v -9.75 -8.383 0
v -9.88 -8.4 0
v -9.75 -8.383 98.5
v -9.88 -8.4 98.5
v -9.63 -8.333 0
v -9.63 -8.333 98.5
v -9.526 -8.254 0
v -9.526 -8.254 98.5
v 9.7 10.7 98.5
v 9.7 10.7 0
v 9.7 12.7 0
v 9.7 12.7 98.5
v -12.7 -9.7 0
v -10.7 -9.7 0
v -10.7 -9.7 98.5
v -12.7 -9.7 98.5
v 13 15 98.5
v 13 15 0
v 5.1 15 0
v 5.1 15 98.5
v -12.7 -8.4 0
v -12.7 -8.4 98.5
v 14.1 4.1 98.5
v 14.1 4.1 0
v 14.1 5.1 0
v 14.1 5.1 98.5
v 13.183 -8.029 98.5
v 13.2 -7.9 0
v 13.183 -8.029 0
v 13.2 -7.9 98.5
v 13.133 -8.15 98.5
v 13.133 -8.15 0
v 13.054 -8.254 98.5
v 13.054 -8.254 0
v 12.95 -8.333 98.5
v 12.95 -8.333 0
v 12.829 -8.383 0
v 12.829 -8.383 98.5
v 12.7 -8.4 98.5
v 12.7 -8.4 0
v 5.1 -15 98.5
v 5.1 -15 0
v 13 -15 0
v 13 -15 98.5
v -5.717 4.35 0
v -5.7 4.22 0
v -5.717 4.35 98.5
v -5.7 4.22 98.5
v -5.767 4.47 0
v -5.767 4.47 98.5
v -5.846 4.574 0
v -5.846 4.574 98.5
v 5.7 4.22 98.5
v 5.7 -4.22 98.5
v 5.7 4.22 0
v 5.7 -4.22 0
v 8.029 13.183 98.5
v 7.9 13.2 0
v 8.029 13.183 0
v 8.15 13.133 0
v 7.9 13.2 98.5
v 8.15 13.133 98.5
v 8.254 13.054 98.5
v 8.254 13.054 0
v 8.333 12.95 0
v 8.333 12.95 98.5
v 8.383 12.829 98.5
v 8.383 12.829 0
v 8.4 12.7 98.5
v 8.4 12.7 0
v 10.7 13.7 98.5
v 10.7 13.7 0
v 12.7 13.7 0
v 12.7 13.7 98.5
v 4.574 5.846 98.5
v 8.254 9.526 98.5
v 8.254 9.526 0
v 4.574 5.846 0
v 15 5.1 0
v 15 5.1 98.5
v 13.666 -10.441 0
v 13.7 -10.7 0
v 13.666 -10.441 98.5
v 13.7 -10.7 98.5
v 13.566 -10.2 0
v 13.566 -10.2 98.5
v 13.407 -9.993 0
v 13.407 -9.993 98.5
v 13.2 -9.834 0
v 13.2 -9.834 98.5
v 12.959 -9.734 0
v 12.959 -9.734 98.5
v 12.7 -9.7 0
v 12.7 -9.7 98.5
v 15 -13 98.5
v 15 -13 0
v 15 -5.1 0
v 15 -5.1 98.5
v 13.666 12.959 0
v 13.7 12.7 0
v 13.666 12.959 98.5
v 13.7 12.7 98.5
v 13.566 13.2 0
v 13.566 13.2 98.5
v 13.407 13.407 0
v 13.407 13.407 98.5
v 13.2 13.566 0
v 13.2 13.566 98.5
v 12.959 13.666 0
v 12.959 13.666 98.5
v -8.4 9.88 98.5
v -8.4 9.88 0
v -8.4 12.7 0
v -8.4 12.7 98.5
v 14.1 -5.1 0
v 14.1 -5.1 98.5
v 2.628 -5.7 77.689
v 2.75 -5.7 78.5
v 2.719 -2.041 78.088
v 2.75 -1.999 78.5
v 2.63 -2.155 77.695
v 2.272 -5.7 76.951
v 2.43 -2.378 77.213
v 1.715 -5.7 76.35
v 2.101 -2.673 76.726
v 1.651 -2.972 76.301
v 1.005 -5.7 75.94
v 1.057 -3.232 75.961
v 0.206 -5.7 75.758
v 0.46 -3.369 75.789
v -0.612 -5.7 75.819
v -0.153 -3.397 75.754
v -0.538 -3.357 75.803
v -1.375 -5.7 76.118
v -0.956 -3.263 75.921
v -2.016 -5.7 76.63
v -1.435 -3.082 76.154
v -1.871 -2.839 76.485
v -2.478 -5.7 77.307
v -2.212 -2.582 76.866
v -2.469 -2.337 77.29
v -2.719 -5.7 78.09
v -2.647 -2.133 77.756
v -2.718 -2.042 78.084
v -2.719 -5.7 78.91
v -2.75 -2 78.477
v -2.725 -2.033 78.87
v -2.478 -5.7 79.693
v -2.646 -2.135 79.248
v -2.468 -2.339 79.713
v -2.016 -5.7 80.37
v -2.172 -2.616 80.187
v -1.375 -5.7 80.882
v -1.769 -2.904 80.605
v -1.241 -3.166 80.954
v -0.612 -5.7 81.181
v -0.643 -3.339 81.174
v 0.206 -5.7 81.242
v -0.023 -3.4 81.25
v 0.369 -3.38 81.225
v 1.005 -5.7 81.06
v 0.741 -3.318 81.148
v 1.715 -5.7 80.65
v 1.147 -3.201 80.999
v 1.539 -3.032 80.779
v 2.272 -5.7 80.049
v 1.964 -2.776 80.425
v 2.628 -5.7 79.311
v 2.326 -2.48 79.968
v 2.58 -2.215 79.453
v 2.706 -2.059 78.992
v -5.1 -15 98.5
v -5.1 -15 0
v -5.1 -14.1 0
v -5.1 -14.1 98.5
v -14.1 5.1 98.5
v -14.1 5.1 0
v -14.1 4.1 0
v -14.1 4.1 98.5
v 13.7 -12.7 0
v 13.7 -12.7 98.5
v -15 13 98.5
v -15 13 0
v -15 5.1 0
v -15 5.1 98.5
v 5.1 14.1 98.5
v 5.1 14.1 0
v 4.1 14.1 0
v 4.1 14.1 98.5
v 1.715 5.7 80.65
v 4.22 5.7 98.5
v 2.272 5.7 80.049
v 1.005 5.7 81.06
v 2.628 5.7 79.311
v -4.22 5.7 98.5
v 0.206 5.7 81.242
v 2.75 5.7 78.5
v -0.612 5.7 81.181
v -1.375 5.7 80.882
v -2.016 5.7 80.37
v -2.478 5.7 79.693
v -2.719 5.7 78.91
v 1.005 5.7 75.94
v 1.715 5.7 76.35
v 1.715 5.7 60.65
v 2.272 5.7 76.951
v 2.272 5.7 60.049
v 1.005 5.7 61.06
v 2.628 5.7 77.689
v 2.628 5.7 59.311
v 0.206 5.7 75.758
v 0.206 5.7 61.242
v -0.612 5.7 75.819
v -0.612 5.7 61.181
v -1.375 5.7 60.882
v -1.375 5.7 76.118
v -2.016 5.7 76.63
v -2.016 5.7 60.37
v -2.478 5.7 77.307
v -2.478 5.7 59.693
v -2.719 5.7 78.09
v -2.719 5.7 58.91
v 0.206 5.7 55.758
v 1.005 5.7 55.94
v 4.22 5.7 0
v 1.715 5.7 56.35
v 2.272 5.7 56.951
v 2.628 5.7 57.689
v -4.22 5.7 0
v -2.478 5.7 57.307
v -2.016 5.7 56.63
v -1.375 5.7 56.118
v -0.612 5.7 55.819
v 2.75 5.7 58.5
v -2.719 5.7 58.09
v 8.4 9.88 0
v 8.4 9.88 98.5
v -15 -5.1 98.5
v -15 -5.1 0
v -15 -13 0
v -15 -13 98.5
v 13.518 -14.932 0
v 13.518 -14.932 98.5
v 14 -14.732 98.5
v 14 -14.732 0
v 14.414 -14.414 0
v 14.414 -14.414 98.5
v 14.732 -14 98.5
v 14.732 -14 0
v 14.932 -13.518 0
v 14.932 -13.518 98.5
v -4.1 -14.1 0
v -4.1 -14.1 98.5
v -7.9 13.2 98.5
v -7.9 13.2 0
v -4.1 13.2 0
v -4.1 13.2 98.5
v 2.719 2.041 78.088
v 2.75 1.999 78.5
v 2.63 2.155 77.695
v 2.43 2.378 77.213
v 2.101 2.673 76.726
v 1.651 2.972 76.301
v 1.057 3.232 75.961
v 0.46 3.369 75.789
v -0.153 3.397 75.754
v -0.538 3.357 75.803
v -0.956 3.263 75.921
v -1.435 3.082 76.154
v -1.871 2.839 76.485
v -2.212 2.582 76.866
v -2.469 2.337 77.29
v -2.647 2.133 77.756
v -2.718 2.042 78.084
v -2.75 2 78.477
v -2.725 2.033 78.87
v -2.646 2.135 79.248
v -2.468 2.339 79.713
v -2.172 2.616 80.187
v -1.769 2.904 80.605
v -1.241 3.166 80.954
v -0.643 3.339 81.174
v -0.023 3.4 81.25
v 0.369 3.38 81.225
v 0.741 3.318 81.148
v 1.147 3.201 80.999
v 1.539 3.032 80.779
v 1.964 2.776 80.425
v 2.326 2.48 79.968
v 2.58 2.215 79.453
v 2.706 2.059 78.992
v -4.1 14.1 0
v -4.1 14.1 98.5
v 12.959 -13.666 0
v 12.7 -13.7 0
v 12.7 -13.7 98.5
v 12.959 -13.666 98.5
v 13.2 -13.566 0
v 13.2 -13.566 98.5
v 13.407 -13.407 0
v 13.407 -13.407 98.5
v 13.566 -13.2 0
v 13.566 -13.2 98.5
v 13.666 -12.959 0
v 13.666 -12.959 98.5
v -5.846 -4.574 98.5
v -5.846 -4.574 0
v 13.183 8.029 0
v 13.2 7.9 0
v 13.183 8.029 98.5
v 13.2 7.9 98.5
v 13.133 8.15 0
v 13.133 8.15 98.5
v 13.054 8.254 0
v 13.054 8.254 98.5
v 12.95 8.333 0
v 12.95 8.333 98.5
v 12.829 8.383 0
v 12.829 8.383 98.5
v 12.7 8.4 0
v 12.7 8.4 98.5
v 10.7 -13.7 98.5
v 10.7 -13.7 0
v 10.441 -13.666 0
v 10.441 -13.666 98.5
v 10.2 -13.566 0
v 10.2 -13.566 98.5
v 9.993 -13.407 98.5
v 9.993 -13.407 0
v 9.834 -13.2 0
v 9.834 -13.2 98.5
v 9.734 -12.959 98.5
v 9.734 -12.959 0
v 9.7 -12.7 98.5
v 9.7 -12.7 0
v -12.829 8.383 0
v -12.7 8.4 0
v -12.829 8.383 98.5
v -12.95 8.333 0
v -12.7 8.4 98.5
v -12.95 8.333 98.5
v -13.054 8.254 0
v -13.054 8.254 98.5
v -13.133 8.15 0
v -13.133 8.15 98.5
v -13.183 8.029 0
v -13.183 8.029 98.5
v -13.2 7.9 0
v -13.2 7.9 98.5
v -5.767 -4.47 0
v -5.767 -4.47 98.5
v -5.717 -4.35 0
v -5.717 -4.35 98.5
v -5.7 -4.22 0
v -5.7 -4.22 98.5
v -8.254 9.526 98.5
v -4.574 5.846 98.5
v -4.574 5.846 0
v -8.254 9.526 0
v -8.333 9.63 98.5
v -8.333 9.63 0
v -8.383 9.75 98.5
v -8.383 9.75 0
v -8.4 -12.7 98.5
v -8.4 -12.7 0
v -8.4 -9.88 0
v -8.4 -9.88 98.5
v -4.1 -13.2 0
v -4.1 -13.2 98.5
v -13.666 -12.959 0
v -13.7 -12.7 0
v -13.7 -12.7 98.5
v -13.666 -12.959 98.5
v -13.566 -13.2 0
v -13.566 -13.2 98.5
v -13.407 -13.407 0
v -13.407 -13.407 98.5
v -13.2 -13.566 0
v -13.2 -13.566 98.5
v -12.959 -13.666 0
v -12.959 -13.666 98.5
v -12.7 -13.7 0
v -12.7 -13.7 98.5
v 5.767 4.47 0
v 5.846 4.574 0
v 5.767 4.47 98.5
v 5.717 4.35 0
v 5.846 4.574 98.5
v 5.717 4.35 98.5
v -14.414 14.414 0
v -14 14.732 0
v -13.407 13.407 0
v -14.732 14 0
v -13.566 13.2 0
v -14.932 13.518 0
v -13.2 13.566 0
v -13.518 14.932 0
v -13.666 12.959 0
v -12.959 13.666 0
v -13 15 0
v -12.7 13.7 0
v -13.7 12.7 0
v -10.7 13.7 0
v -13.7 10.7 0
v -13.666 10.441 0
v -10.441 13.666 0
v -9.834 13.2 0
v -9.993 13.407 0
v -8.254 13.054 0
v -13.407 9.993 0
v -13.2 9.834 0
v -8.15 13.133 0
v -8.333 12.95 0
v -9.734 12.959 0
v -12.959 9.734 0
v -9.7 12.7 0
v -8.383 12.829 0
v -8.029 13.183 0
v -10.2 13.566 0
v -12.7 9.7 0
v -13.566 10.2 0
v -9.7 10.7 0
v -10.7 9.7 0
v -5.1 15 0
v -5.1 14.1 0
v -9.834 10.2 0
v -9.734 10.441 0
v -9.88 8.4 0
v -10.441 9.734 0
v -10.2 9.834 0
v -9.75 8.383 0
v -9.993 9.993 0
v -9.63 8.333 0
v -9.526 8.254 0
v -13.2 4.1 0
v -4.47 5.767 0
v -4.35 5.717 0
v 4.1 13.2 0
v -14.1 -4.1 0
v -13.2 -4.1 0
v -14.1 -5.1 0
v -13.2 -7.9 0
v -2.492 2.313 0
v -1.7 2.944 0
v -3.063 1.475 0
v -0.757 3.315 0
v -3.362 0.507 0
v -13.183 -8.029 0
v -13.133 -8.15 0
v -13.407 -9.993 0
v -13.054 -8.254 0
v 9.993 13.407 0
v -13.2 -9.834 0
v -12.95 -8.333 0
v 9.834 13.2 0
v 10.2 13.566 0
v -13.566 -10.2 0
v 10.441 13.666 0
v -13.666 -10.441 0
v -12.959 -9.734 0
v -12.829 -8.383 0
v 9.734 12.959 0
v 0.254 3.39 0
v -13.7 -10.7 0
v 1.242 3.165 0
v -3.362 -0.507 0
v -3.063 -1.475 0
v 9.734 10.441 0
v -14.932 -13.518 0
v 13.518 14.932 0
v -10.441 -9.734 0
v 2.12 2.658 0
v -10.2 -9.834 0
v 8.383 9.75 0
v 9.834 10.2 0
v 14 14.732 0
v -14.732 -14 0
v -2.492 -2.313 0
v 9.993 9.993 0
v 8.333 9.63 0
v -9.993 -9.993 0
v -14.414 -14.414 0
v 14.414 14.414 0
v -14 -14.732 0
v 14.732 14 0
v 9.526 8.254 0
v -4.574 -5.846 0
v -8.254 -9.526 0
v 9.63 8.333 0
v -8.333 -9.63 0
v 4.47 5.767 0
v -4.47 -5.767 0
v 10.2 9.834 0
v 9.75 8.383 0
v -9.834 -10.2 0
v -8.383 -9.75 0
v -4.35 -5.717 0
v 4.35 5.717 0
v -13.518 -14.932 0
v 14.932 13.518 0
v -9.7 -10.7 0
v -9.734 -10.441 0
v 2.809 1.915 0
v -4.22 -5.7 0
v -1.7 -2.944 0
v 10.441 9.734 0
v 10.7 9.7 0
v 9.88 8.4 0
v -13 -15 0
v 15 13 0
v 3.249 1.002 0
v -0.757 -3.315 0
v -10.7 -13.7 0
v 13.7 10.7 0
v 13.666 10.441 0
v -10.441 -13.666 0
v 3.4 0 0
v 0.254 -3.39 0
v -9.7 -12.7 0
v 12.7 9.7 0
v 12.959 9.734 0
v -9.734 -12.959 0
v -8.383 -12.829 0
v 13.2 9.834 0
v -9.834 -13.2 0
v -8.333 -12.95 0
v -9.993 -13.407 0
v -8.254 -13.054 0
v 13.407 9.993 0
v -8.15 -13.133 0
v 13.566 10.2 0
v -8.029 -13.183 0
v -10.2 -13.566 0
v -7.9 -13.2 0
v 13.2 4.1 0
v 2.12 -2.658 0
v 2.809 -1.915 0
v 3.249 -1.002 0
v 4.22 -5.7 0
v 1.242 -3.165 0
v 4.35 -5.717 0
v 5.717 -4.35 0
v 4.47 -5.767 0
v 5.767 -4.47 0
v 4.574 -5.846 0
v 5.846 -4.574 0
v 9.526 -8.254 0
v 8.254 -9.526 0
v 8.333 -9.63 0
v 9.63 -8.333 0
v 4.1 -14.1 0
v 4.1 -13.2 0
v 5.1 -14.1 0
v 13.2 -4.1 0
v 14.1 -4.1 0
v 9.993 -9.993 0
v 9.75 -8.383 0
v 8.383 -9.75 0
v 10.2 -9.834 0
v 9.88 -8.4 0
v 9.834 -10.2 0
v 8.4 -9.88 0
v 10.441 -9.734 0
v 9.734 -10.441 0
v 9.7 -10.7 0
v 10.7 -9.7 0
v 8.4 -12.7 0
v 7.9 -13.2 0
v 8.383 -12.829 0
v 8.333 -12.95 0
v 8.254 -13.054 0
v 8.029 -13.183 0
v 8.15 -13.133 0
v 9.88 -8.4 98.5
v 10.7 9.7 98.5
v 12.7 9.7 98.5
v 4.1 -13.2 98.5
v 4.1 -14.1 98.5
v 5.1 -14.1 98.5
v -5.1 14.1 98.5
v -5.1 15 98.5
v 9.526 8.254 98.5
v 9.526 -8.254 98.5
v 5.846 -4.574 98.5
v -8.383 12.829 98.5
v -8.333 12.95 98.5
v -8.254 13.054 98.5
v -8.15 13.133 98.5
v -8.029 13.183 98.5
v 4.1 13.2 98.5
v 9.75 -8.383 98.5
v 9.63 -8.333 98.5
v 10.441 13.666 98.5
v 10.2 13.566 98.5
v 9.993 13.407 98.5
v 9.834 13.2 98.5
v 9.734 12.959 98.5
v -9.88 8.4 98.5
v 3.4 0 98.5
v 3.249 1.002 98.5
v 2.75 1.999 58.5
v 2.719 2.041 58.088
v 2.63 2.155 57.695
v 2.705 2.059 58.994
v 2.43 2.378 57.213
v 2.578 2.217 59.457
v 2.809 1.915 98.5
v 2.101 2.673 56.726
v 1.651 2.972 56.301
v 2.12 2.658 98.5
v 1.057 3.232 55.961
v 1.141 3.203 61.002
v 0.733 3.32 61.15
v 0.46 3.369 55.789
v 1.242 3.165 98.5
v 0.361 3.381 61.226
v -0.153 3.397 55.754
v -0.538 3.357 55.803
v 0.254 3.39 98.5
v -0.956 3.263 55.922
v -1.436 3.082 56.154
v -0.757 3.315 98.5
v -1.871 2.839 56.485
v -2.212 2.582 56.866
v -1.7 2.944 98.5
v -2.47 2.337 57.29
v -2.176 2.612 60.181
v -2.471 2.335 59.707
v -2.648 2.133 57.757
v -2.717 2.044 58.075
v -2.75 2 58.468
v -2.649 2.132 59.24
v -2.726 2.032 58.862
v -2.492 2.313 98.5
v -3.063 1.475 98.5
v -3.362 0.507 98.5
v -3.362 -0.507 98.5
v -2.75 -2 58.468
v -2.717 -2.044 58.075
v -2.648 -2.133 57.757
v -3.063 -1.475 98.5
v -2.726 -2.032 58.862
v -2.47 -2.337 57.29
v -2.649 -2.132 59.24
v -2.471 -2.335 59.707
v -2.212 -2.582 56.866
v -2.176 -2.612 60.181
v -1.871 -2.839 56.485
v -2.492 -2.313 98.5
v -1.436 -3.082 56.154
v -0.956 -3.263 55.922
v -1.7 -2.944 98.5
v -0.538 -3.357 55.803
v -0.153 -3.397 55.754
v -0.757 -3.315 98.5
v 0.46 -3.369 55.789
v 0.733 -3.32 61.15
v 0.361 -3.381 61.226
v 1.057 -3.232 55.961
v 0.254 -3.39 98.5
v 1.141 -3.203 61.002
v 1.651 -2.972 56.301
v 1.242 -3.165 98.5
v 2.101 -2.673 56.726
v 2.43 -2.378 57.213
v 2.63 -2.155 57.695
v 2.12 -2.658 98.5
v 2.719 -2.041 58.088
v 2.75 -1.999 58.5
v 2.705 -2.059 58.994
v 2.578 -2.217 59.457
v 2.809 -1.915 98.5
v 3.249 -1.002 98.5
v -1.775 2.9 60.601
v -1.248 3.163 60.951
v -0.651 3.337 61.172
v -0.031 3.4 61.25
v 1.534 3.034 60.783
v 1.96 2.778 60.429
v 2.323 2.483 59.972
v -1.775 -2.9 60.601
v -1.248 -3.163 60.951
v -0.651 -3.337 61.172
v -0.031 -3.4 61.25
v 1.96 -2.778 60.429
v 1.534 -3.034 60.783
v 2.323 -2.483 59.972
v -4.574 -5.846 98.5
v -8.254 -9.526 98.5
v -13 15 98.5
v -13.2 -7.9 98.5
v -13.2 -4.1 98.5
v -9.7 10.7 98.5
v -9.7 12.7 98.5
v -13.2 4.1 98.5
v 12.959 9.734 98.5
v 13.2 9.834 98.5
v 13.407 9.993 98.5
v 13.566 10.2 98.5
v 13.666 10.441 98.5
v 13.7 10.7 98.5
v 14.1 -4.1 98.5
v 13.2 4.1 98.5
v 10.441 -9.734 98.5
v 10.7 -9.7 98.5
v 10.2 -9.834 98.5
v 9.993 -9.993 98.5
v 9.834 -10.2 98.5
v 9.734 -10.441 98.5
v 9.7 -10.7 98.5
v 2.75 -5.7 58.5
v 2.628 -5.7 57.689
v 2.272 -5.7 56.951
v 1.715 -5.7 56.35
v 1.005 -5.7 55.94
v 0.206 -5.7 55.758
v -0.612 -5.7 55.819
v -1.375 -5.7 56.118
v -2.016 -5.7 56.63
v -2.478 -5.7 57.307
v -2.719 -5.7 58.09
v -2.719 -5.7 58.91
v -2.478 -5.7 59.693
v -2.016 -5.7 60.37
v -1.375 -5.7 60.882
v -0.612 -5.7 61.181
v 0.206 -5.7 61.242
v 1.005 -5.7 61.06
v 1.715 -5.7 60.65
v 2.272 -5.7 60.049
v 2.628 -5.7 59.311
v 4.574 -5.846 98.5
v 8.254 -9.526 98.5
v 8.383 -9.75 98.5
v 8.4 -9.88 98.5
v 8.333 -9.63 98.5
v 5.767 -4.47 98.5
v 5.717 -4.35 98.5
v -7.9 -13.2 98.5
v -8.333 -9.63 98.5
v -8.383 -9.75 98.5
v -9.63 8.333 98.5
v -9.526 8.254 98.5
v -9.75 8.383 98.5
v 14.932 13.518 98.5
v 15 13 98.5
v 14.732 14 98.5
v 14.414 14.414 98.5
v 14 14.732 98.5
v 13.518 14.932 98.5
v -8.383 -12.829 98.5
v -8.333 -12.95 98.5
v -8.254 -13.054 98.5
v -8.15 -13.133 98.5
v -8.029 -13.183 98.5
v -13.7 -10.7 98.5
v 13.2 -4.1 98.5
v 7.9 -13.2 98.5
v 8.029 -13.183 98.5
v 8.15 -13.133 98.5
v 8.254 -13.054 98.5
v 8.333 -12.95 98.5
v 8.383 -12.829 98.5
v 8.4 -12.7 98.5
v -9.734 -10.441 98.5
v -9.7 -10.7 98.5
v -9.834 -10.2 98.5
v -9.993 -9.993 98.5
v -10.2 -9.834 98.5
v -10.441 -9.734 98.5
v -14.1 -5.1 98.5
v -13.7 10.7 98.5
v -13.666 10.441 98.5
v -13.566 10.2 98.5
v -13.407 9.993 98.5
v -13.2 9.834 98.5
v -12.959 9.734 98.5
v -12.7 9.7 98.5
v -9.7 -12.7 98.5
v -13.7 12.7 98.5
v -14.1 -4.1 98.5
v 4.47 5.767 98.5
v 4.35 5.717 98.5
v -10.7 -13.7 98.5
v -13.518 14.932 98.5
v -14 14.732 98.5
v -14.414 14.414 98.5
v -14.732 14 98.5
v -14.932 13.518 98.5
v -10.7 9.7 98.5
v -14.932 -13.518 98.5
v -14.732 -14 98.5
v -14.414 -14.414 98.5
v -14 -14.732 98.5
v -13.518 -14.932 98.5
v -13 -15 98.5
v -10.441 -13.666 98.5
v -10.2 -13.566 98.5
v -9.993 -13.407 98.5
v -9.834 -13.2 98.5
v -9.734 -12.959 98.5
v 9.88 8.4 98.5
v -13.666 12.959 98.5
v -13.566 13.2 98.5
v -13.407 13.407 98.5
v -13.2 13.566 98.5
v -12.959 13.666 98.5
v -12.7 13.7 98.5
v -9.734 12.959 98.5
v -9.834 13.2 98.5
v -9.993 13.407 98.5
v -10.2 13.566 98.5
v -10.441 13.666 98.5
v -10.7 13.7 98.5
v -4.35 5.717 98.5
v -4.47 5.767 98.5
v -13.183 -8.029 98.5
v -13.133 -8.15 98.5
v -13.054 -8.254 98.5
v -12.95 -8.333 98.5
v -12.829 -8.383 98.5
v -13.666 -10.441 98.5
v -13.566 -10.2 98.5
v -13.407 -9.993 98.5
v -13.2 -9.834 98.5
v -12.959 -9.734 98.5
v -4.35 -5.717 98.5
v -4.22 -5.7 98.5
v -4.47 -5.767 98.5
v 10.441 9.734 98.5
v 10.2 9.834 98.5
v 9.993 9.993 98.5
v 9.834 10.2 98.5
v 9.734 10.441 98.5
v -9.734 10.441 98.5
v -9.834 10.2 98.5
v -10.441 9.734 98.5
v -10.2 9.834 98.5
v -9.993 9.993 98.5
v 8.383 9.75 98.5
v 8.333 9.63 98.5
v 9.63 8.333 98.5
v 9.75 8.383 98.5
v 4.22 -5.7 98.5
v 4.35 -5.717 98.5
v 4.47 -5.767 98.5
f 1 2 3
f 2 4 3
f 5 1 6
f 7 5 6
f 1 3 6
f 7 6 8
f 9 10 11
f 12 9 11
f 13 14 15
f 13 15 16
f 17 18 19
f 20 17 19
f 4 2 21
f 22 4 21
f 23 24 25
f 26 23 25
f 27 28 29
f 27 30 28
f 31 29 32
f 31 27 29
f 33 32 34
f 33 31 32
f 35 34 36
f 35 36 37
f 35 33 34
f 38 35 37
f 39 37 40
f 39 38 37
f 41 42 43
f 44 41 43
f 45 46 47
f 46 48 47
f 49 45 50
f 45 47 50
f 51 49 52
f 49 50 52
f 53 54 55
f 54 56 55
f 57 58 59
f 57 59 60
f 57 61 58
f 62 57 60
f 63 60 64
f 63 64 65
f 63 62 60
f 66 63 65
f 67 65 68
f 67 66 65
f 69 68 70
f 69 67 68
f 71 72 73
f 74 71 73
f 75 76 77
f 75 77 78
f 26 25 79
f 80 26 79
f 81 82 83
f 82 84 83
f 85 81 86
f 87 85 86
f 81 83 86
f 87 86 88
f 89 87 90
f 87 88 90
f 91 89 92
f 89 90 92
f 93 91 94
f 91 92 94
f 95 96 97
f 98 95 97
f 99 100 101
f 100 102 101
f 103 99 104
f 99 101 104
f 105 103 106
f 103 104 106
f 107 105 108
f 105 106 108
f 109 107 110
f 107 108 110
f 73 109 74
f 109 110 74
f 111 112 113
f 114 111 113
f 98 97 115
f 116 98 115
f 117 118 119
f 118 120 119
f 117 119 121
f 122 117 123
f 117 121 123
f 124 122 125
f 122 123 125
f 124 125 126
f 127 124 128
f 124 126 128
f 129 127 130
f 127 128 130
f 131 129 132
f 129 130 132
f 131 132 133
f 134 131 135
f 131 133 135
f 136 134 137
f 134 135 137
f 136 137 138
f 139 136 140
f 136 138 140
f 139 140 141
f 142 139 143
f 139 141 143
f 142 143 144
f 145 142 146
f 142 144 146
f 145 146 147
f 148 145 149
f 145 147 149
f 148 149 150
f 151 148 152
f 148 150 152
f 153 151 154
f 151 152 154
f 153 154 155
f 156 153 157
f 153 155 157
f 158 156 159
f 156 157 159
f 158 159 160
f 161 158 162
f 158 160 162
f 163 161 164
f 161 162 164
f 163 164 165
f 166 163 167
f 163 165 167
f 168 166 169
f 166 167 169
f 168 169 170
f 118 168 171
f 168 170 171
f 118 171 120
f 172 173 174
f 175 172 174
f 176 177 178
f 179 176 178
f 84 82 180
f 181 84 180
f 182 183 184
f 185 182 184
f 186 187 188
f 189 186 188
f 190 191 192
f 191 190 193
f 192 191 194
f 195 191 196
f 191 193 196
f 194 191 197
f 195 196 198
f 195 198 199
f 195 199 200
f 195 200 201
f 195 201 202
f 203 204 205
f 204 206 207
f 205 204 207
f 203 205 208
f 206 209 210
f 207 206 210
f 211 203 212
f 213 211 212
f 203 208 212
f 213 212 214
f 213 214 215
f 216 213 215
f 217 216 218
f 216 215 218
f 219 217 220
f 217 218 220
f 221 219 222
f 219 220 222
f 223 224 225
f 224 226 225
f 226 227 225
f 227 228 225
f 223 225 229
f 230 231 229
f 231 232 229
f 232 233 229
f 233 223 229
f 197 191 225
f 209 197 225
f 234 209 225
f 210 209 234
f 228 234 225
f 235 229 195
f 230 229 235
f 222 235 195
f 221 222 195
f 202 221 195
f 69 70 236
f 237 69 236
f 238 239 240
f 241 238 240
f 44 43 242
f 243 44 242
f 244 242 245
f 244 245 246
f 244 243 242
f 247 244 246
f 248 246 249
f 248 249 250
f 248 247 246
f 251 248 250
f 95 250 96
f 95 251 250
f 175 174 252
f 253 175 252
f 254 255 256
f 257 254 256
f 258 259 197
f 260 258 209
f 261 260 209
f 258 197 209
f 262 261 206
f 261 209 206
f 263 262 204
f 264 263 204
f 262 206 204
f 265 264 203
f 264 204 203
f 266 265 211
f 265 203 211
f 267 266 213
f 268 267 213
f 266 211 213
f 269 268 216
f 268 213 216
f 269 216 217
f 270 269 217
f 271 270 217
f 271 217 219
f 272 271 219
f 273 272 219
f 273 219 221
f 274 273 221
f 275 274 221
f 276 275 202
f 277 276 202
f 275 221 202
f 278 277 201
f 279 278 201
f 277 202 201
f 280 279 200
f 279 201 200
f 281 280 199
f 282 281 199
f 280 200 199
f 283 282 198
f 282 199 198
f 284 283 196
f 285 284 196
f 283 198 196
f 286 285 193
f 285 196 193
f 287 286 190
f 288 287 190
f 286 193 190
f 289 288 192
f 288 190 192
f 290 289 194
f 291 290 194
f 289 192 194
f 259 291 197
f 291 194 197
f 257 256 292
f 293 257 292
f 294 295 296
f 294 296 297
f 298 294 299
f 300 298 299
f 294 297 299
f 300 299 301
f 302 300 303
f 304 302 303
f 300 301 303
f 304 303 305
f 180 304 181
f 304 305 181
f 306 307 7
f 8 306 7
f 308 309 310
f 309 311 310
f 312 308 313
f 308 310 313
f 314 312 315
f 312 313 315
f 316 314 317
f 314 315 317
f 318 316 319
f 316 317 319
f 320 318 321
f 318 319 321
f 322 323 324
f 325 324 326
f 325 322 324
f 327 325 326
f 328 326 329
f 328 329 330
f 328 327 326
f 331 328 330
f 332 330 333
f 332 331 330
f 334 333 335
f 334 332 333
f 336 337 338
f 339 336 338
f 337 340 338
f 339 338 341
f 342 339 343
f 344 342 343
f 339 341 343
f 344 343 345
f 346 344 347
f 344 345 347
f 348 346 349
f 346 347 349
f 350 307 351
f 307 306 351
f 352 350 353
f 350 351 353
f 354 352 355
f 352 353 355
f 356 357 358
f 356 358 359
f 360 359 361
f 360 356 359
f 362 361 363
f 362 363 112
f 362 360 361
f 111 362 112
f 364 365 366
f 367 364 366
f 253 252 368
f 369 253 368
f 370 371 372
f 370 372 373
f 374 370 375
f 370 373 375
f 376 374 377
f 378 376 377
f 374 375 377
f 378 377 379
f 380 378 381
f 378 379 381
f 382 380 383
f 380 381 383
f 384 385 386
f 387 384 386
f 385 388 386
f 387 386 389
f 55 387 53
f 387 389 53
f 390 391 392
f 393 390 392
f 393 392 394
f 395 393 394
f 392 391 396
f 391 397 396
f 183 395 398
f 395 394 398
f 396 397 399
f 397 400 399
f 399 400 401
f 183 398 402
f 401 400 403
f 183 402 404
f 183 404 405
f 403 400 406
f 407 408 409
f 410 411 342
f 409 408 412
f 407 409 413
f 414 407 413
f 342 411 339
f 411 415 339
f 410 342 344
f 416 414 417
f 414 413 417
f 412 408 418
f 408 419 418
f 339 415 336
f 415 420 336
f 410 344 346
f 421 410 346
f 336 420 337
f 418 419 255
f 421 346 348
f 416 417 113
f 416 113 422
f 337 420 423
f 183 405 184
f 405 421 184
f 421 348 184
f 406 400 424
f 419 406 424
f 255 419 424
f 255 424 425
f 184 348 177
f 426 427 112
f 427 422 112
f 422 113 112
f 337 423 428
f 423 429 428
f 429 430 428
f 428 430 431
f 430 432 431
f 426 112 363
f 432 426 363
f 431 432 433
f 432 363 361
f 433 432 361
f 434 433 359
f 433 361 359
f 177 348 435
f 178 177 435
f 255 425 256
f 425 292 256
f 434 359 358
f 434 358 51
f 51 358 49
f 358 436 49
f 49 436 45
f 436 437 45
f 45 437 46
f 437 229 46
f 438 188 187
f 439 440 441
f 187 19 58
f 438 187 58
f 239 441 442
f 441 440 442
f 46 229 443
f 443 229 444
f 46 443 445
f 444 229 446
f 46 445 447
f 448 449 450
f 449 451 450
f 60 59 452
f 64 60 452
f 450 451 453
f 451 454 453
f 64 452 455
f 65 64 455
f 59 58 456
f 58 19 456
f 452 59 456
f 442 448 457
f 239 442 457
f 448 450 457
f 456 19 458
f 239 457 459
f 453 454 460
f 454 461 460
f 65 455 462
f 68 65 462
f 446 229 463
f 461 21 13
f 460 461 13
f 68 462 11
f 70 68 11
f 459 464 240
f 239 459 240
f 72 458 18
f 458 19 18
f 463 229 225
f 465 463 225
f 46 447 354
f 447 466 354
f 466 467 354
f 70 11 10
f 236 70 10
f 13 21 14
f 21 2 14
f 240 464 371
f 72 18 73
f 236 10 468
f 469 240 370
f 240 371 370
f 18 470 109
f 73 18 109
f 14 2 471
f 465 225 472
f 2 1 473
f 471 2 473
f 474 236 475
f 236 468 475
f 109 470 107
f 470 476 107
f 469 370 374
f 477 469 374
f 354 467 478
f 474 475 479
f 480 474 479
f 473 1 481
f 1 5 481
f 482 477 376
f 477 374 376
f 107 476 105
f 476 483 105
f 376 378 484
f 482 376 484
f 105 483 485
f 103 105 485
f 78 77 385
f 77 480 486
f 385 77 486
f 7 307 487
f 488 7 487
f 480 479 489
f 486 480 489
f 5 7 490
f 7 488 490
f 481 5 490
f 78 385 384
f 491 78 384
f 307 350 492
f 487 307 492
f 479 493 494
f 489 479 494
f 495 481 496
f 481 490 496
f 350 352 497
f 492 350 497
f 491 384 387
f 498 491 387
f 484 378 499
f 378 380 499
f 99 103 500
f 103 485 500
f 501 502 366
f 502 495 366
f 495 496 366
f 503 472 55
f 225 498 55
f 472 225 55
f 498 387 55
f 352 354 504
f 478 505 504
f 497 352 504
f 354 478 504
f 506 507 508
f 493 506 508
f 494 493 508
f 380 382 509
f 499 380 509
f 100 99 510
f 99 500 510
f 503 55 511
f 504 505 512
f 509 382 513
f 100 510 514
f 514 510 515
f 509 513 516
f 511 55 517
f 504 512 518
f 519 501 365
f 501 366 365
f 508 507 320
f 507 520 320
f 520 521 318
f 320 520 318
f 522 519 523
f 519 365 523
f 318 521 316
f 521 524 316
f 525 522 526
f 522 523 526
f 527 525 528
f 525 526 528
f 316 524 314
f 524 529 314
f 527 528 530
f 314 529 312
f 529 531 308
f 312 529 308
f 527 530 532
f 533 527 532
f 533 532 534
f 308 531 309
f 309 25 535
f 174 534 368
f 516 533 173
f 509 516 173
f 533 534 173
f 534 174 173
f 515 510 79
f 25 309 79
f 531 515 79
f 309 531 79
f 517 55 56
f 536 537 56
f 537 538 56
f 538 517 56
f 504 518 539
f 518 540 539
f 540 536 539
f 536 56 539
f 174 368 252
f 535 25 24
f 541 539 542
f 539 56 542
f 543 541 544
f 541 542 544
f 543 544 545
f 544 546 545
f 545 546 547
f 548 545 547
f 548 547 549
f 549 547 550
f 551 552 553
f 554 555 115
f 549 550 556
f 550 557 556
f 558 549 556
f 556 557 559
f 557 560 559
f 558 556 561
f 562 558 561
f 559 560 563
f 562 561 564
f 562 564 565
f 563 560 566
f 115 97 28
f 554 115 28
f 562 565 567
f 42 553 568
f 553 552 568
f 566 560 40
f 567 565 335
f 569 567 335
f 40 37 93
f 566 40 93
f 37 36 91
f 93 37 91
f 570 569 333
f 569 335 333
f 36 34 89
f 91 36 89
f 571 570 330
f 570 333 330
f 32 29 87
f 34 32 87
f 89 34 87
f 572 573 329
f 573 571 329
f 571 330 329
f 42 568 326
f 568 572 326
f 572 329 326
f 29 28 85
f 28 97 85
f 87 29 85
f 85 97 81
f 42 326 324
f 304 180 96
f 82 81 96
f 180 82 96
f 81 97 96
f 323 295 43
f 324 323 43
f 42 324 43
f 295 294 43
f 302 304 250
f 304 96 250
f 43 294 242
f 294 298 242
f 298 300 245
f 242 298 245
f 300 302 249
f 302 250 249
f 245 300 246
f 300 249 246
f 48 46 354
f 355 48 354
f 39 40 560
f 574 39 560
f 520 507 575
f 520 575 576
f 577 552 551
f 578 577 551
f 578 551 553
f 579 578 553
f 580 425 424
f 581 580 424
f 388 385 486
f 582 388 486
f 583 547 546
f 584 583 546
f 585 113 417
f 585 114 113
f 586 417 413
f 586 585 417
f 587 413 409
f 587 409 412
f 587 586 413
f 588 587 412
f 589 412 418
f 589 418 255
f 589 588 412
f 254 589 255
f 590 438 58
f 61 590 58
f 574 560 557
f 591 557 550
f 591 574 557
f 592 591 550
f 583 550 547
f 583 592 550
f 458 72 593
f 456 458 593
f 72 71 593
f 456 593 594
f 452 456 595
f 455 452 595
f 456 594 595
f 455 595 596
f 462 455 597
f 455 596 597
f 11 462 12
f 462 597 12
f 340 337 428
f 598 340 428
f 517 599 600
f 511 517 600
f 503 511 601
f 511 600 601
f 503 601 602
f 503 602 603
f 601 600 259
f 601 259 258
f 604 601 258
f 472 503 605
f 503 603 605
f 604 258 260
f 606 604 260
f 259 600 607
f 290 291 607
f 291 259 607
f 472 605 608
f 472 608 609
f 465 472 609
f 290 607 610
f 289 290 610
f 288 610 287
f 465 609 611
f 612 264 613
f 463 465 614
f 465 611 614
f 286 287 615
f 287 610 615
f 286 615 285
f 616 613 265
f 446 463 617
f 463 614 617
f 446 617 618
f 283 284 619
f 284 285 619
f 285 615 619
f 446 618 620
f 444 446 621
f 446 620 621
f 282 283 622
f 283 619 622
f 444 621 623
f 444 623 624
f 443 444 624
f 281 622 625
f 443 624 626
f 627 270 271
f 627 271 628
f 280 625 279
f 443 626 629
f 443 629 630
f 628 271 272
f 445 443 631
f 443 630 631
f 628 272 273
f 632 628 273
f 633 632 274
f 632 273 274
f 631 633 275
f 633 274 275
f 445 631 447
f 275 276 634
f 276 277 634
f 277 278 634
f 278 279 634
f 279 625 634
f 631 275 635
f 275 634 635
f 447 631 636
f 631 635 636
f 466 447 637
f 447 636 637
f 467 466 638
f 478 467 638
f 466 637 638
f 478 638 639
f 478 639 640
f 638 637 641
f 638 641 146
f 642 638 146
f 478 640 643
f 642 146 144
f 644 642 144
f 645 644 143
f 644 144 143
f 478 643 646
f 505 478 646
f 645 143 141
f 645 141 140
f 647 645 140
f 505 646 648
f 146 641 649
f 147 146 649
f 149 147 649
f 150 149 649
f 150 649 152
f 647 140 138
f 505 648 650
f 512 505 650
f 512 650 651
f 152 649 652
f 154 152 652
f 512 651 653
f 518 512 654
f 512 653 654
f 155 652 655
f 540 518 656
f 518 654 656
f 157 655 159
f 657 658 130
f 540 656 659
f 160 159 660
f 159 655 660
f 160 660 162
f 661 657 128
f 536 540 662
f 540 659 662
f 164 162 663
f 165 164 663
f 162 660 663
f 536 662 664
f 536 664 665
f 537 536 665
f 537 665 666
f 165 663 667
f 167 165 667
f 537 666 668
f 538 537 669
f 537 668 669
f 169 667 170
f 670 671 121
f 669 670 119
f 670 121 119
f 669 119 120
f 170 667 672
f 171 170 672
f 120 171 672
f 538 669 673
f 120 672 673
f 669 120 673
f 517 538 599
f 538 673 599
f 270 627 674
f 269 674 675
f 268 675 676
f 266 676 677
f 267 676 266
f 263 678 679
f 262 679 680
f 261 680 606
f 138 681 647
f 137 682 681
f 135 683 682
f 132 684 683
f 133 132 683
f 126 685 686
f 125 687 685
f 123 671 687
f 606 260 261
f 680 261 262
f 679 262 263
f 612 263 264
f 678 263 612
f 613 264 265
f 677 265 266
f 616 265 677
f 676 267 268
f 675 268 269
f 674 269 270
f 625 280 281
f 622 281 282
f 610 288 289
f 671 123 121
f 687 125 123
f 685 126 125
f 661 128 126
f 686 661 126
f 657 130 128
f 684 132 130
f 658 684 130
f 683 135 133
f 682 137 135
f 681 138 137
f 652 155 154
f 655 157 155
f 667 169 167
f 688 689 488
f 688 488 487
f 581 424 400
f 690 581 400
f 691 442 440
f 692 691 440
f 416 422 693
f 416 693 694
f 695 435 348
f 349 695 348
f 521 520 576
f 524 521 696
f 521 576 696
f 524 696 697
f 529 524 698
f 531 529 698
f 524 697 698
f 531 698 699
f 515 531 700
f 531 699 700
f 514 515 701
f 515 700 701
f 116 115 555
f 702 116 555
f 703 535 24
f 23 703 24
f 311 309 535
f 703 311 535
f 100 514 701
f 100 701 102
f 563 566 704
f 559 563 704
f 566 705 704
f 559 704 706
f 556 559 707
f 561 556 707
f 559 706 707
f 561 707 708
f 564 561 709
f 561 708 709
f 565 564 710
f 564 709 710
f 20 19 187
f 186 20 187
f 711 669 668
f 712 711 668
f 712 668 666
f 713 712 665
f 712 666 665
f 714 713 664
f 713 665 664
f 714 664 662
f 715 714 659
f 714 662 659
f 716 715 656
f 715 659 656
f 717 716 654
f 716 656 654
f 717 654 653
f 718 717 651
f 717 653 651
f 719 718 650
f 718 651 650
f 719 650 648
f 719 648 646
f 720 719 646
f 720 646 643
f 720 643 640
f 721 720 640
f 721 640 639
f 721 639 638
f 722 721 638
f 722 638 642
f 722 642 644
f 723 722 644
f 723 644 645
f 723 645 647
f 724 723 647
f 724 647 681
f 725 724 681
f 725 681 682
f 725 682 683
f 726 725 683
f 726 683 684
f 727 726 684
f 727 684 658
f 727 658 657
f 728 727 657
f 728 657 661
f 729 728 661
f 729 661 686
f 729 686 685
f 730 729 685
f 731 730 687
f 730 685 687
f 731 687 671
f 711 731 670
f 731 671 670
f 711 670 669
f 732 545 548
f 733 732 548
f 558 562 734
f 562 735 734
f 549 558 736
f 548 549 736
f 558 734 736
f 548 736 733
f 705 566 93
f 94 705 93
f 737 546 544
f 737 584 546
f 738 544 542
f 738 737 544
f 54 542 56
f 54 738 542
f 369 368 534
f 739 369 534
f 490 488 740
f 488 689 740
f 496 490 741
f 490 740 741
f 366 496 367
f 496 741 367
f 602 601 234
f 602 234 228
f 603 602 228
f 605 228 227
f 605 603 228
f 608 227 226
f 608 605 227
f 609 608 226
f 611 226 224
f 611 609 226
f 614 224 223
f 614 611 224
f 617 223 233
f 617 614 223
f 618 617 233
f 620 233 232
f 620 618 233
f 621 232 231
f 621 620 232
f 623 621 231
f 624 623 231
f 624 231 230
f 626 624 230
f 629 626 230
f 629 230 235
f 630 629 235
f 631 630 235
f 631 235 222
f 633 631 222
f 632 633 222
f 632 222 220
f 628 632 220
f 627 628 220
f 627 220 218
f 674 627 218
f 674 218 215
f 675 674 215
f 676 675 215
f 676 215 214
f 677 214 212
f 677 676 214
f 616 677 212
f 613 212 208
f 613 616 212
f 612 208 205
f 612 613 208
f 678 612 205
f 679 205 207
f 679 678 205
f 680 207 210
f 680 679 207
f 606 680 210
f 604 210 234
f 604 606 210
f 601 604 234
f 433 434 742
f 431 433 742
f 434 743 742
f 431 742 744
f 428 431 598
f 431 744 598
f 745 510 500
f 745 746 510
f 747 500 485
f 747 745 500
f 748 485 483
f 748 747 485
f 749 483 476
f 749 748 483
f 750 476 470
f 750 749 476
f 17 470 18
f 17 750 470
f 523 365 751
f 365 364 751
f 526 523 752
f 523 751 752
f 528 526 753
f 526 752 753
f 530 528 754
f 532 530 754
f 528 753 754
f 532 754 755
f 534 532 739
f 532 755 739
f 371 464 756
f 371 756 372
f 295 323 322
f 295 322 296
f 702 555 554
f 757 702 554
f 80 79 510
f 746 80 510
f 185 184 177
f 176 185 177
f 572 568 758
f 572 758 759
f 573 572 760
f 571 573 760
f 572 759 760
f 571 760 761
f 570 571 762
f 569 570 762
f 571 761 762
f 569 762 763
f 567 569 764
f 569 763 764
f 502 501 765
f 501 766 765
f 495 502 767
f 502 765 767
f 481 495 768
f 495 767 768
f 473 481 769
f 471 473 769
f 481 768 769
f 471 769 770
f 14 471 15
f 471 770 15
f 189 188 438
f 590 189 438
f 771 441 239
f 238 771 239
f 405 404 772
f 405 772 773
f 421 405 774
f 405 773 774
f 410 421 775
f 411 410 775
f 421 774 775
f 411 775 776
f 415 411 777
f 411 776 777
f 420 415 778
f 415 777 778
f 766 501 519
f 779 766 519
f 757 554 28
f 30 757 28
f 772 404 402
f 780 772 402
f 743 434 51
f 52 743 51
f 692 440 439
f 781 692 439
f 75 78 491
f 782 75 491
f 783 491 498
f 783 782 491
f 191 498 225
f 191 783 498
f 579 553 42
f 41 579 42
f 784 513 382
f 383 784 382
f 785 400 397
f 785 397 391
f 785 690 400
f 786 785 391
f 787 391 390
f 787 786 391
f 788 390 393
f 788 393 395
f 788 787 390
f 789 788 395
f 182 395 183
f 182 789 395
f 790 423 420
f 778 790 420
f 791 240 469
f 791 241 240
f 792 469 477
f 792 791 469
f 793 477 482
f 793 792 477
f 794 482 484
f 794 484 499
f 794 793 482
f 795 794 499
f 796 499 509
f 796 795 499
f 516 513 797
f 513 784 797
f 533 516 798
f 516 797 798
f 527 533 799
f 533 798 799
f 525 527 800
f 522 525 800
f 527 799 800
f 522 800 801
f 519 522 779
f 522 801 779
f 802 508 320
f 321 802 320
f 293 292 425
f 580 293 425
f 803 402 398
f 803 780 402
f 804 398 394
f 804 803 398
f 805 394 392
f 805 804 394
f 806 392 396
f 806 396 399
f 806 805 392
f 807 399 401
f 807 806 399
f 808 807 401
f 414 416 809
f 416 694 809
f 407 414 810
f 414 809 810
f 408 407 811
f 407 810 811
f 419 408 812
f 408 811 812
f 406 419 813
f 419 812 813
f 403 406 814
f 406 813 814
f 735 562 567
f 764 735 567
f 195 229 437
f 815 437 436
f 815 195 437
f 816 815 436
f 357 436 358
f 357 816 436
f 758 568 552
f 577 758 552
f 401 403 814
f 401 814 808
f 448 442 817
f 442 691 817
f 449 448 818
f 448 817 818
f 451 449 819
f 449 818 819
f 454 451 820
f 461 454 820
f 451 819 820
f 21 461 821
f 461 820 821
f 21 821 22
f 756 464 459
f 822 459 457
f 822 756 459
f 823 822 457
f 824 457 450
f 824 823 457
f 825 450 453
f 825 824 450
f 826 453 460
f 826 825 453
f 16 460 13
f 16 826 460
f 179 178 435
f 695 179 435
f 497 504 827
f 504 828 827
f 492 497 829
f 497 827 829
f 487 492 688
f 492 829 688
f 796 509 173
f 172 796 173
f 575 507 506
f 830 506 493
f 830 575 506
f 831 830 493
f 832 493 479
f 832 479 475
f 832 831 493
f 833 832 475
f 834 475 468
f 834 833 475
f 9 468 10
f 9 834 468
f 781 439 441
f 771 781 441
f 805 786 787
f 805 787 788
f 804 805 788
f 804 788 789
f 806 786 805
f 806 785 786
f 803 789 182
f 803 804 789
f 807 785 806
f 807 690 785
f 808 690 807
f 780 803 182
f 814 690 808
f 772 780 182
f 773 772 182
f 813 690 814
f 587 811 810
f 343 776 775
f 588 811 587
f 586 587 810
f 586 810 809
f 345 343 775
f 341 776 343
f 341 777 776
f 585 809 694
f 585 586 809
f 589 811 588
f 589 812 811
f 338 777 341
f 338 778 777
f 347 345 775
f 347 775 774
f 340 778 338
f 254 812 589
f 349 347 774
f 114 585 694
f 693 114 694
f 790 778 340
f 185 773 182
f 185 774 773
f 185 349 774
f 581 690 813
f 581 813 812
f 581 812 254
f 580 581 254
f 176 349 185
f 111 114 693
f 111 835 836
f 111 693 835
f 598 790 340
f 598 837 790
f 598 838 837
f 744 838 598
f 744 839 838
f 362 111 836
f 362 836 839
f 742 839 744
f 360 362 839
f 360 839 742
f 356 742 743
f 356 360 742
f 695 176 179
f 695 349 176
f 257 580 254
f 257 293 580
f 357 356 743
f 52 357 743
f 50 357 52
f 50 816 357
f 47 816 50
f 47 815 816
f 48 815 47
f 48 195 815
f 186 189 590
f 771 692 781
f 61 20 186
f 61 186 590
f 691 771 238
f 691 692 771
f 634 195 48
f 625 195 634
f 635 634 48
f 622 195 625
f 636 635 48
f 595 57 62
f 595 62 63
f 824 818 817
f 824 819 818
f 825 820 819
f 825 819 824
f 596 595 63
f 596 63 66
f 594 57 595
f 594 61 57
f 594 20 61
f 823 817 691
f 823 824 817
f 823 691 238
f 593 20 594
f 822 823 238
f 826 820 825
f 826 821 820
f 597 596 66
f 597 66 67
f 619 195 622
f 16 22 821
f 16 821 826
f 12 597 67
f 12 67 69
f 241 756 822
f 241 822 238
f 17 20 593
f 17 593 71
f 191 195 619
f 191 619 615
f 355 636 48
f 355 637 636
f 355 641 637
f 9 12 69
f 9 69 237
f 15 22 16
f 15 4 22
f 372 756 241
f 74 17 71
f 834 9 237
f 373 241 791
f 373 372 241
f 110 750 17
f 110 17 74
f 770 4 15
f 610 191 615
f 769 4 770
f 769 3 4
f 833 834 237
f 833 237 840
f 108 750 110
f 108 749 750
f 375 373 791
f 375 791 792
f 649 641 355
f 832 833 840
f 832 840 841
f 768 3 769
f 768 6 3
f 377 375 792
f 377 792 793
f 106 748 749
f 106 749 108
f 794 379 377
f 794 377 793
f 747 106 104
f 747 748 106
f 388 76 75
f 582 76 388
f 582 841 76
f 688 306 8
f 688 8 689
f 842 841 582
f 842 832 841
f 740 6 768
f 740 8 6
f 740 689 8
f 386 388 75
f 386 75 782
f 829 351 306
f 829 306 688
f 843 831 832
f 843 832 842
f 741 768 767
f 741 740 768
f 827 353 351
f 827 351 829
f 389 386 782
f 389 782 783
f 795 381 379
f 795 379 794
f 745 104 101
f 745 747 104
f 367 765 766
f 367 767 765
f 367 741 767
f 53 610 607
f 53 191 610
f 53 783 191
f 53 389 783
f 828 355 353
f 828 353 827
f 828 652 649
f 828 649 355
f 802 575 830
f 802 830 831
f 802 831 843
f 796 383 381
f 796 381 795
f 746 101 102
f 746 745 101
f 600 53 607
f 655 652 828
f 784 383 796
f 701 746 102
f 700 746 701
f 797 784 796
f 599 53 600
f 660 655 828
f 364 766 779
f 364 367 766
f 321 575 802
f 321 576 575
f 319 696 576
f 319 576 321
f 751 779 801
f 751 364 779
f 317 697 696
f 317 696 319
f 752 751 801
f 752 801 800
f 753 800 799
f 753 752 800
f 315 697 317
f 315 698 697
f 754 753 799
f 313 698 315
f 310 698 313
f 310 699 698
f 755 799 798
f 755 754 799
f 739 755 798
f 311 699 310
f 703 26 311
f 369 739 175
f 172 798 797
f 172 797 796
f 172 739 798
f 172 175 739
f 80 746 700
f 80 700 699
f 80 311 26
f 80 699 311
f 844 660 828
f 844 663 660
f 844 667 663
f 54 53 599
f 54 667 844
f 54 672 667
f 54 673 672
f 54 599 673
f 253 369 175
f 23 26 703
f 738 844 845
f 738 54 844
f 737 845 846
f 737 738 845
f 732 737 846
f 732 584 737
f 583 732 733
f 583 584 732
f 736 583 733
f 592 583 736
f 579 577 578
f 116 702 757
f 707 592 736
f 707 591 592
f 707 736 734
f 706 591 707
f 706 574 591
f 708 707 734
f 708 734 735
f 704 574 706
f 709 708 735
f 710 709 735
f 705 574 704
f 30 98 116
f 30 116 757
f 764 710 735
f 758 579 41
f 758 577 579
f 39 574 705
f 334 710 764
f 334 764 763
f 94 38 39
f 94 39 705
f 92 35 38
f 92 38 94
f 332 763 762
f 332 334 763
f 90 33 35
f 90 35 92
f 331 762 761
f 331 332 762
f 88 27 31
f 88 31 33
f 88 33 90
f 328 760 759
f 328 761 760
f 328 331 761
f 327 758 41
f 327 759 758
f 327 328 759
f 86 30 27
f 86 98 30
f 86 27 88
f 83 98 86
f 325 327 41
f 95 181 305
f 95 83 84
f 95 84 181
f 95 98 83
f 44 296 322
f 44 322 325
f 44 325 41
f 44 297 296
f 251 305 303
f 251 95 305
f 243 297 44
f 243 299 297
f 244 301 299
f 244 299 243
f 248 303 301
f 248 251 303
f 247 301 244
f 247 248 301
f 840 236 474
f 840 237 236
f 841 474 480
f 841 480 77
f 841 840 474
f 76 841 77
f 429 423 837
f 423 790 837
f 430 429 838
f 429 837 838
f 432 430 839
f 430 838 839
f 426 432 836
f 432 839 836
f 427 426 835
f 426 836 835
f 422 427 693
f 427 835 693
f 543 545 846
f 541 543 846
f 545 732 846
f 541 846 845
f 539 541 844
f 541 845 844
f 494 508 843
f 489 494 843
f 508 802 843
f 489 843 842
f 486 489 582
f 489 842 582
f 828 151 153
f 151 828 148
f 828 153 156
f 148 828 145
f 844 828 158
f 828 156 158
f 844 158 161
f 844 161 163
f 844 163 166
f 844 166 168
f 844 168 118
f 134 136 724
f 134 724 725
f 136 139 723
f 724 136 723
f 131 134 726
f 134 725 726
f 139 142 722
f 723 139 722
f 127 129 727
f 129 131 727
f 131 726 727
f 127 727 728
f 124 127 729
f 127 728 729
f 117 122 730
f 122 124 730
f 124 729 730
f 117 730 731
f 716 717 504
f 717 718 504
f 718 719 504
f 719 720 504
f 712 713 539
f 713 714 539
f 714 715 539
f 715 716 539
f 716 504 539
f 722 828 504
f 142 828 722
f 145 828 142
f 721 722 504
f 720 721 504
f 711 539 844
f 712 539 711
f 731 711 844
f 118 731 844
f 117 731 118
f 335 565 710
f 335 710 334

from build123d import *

# Parameters (mm, degrees)
SKETCH_1_W                       = 4
SKETCH_1_H                       = 4
EXTRUDE_1_DEPTH                  = 98.5
FILLET_1_R                       = 1
FILLET_2_R                       = 2
FILLET_3_R                       = 0.5
PATTERN_CIRCULAR_1_COUNT         = 4
FILLET_1_OF_PATTERN_CIRCULAR_1_R = 1
FILLET_2_OF_PATTERN_CIRCULAR_1_R = 2
FILLET_3_OF_PATTERN_CIRCULAR_1_R = 0.5
SKETCH_2_R                       = 3.4
CUT_EXTRUDE_1_DEPTH              = 99.5
SKETCH_3_R                       = 2.75
CUT_EXTRUDE_2_DEPTH              = 530


with BuildPart() as part:
    # 草图1 → 凸台-拉伸1 (new body)
    with BuildSketch(Plane.XY):
        Polygon((5.7, 0), (5.7, 4.427207794), (9.672792206, 8.4), (13.2, 8.4), (13.2, 4.1), (14.1, 4.1), (14.1, 5.1), (15, 5.1), (15, 15), (5.1, 15), (5.1, 14.1), (4.1, 14.1), (4.1, 13.2), (8.4, 13.2), (8.4, 9.672792206), (4.427207794, 5.7), (0, 5.7), (0, 0), align=None)
        with Locations((11.7, 11.7)):
            Rectangle(SKETCH_1_W, SKETCH_1_H, mode=Mode.SUBTRACT)
    extrude_1 = extrude(amount=EXTRUDE_1_DEPTH)

    # 圆角1
    fillet_1_edges = [part.edges().sort_by_distance(p)[0] for p in [
        (13.7, 9.7, 49.25),
        (13.7, 13.7, 49.25),
        (9.7, 13.7, 49.25),
        (9.7, 9.7, 49.25),
    ]]
    fillet(fillet_1_edges, radius=FILLET_1_R)

    # 圆角2
    fillet_2_edges = [part.edges().sort_by_distance(p)[0] for p in [
        (15, 15, 49.25),
    ]]
    fillet(fillet_2_edges, radius=FILLET_2_R)

    # 圆角3
    fillet_3_edges = [part.edges().sort_by_distance(p)[0] for p in [
        (4.427207794, 5.7, 49.25),
        (8.4, 9.672792206, 49.25),
        (8.4, 13.2, 49.25),
        (13.2, 8.4, 49.25),
        (9.672792206, 8.4, 49.25),
        (5.7, 4.427207794, 49.25),
    ]]
    fillet(fillet_3_edges, radius=FILLET_3_R)

    # 阵列(圆周)1: 凸台-拉伸1 ×4 about axis
    pattern_circular_1_axis = Axis((0, 0, 0), (0, 0, 1))
    for i in range(1, PATTERN_CIRCULAR_1_COUNT):
        add(extrude_1.rotate(pattern_circular_1_axis, i * 360 / PATTERN_CIRCULAR_1_COUNT))

    # 圆角1 of 阵列(圆周)1
    fillet_1_of_pattern_circular_1_edges = [part.edges().sort_by_distance(p)[0] for p in [
        (-9.7, 13.7, 49.25),
        (-13.7, 13.7, 49.25),
        (-13.7, 9.7, 49.25),
        (-9.7, 9.7, 49.25),
        (-13.7, -9.7, 49.25),
        (-13.7, -13.7, 49.25),
        (-9.7, -13.7, 49.25),
        (-9.7, -9.7, 49.25),
        (9.7, -13.7, 49.25),
        (13.7, -13.7, 49.25),
        (13.7, -9.7, 49.25),
        (9.7, -9.7, 49.25),
    ]]
    fillet(fillet_1_of_pattern_circular_1_edges, radius=FILLET_1_OF_PATTERN_CIRCULAR_1_R)

    # 圆角2 of 阵列(圆周)1
    fillet_2_of_pattern_circular_1_edges = [part.edges().sort_by_distance(p)[0] for p in [
        (-15, 15, 49.25),
        (-15, -15, 49.25),
        (15, -15, 49.25),
    ]]
    fillet(fillet_2_of_pattern_circular_1_edges, radius=FILLET_2_OF_PATTERN_CIRCULAR_1_R)

    # 圆角3 of 阵列(圆周)1
    fillet_3_of_pattern_circular_1_edges = [part.edges().sort_by_distance(p)[0] for p in [
        (-5.7, 4.427207794, 49.25),
        (-9.672792206, 8.4, 49.25),
        (-13.2, 8.4, 49.25),
        (-8.4, 13.2, 49.25),
        (-8.4, 9.672792206, 49.25),
        (-4.427207794, 5.7, 49.25),
        (-4.427207794, -5.7, 49.25),
        (-8.4, -9.672792206, 49.25),
        (-8.4, -13.2, 49.25),
        (-13.2, -8.4, 49.25),
        (-9.672792206, -8.4, 49.25),
        (-5.7, -4.427207794, 49.25),
        (5.7, -4.427207794, 49.25),
        (9.672792206, -8.4, 49.25),
        (13.2, -8.4, 49.25),
        (8.4, -13.2, 49.25),
        (8.4, -9.672792206, 49.25),
        (4.427207794, -5.7, 49.25),
    ]]
    fillet(fillet_3_of_pattern_circular_1_edges, radius=FILLET_3_OF_PATTERN_CIRCULAR_1_R)

    # 草图2 → 切除-拉伸1 (cut, through all)
    with BuildSketch(Plane.XY.offset(98.5)):
        Circle(SKETCH_2_R)
    extrude(amount=-CUT_EXTRUDE_1_DEPTH, mode=Mode.SUBTRACT)

    # 草图3 → 切除-拉伸2 (cut, symmetric)
    with BuildSketch(Plane(origin=(0, 0, 0), x_dir=(1, 0, 0), z_dir=(0, 1, 0))):
        with Locations((0, -58.5)):
            Circle(SKETCH_3_R)
        with Locations((0, -78.5)):
            Circle(SKETCH_3_R)
    extrude(amount=CUT_EXTRUDE_2_DEPTH, both=True, mode=Mode.SUBTRACT)


solid = part.part
